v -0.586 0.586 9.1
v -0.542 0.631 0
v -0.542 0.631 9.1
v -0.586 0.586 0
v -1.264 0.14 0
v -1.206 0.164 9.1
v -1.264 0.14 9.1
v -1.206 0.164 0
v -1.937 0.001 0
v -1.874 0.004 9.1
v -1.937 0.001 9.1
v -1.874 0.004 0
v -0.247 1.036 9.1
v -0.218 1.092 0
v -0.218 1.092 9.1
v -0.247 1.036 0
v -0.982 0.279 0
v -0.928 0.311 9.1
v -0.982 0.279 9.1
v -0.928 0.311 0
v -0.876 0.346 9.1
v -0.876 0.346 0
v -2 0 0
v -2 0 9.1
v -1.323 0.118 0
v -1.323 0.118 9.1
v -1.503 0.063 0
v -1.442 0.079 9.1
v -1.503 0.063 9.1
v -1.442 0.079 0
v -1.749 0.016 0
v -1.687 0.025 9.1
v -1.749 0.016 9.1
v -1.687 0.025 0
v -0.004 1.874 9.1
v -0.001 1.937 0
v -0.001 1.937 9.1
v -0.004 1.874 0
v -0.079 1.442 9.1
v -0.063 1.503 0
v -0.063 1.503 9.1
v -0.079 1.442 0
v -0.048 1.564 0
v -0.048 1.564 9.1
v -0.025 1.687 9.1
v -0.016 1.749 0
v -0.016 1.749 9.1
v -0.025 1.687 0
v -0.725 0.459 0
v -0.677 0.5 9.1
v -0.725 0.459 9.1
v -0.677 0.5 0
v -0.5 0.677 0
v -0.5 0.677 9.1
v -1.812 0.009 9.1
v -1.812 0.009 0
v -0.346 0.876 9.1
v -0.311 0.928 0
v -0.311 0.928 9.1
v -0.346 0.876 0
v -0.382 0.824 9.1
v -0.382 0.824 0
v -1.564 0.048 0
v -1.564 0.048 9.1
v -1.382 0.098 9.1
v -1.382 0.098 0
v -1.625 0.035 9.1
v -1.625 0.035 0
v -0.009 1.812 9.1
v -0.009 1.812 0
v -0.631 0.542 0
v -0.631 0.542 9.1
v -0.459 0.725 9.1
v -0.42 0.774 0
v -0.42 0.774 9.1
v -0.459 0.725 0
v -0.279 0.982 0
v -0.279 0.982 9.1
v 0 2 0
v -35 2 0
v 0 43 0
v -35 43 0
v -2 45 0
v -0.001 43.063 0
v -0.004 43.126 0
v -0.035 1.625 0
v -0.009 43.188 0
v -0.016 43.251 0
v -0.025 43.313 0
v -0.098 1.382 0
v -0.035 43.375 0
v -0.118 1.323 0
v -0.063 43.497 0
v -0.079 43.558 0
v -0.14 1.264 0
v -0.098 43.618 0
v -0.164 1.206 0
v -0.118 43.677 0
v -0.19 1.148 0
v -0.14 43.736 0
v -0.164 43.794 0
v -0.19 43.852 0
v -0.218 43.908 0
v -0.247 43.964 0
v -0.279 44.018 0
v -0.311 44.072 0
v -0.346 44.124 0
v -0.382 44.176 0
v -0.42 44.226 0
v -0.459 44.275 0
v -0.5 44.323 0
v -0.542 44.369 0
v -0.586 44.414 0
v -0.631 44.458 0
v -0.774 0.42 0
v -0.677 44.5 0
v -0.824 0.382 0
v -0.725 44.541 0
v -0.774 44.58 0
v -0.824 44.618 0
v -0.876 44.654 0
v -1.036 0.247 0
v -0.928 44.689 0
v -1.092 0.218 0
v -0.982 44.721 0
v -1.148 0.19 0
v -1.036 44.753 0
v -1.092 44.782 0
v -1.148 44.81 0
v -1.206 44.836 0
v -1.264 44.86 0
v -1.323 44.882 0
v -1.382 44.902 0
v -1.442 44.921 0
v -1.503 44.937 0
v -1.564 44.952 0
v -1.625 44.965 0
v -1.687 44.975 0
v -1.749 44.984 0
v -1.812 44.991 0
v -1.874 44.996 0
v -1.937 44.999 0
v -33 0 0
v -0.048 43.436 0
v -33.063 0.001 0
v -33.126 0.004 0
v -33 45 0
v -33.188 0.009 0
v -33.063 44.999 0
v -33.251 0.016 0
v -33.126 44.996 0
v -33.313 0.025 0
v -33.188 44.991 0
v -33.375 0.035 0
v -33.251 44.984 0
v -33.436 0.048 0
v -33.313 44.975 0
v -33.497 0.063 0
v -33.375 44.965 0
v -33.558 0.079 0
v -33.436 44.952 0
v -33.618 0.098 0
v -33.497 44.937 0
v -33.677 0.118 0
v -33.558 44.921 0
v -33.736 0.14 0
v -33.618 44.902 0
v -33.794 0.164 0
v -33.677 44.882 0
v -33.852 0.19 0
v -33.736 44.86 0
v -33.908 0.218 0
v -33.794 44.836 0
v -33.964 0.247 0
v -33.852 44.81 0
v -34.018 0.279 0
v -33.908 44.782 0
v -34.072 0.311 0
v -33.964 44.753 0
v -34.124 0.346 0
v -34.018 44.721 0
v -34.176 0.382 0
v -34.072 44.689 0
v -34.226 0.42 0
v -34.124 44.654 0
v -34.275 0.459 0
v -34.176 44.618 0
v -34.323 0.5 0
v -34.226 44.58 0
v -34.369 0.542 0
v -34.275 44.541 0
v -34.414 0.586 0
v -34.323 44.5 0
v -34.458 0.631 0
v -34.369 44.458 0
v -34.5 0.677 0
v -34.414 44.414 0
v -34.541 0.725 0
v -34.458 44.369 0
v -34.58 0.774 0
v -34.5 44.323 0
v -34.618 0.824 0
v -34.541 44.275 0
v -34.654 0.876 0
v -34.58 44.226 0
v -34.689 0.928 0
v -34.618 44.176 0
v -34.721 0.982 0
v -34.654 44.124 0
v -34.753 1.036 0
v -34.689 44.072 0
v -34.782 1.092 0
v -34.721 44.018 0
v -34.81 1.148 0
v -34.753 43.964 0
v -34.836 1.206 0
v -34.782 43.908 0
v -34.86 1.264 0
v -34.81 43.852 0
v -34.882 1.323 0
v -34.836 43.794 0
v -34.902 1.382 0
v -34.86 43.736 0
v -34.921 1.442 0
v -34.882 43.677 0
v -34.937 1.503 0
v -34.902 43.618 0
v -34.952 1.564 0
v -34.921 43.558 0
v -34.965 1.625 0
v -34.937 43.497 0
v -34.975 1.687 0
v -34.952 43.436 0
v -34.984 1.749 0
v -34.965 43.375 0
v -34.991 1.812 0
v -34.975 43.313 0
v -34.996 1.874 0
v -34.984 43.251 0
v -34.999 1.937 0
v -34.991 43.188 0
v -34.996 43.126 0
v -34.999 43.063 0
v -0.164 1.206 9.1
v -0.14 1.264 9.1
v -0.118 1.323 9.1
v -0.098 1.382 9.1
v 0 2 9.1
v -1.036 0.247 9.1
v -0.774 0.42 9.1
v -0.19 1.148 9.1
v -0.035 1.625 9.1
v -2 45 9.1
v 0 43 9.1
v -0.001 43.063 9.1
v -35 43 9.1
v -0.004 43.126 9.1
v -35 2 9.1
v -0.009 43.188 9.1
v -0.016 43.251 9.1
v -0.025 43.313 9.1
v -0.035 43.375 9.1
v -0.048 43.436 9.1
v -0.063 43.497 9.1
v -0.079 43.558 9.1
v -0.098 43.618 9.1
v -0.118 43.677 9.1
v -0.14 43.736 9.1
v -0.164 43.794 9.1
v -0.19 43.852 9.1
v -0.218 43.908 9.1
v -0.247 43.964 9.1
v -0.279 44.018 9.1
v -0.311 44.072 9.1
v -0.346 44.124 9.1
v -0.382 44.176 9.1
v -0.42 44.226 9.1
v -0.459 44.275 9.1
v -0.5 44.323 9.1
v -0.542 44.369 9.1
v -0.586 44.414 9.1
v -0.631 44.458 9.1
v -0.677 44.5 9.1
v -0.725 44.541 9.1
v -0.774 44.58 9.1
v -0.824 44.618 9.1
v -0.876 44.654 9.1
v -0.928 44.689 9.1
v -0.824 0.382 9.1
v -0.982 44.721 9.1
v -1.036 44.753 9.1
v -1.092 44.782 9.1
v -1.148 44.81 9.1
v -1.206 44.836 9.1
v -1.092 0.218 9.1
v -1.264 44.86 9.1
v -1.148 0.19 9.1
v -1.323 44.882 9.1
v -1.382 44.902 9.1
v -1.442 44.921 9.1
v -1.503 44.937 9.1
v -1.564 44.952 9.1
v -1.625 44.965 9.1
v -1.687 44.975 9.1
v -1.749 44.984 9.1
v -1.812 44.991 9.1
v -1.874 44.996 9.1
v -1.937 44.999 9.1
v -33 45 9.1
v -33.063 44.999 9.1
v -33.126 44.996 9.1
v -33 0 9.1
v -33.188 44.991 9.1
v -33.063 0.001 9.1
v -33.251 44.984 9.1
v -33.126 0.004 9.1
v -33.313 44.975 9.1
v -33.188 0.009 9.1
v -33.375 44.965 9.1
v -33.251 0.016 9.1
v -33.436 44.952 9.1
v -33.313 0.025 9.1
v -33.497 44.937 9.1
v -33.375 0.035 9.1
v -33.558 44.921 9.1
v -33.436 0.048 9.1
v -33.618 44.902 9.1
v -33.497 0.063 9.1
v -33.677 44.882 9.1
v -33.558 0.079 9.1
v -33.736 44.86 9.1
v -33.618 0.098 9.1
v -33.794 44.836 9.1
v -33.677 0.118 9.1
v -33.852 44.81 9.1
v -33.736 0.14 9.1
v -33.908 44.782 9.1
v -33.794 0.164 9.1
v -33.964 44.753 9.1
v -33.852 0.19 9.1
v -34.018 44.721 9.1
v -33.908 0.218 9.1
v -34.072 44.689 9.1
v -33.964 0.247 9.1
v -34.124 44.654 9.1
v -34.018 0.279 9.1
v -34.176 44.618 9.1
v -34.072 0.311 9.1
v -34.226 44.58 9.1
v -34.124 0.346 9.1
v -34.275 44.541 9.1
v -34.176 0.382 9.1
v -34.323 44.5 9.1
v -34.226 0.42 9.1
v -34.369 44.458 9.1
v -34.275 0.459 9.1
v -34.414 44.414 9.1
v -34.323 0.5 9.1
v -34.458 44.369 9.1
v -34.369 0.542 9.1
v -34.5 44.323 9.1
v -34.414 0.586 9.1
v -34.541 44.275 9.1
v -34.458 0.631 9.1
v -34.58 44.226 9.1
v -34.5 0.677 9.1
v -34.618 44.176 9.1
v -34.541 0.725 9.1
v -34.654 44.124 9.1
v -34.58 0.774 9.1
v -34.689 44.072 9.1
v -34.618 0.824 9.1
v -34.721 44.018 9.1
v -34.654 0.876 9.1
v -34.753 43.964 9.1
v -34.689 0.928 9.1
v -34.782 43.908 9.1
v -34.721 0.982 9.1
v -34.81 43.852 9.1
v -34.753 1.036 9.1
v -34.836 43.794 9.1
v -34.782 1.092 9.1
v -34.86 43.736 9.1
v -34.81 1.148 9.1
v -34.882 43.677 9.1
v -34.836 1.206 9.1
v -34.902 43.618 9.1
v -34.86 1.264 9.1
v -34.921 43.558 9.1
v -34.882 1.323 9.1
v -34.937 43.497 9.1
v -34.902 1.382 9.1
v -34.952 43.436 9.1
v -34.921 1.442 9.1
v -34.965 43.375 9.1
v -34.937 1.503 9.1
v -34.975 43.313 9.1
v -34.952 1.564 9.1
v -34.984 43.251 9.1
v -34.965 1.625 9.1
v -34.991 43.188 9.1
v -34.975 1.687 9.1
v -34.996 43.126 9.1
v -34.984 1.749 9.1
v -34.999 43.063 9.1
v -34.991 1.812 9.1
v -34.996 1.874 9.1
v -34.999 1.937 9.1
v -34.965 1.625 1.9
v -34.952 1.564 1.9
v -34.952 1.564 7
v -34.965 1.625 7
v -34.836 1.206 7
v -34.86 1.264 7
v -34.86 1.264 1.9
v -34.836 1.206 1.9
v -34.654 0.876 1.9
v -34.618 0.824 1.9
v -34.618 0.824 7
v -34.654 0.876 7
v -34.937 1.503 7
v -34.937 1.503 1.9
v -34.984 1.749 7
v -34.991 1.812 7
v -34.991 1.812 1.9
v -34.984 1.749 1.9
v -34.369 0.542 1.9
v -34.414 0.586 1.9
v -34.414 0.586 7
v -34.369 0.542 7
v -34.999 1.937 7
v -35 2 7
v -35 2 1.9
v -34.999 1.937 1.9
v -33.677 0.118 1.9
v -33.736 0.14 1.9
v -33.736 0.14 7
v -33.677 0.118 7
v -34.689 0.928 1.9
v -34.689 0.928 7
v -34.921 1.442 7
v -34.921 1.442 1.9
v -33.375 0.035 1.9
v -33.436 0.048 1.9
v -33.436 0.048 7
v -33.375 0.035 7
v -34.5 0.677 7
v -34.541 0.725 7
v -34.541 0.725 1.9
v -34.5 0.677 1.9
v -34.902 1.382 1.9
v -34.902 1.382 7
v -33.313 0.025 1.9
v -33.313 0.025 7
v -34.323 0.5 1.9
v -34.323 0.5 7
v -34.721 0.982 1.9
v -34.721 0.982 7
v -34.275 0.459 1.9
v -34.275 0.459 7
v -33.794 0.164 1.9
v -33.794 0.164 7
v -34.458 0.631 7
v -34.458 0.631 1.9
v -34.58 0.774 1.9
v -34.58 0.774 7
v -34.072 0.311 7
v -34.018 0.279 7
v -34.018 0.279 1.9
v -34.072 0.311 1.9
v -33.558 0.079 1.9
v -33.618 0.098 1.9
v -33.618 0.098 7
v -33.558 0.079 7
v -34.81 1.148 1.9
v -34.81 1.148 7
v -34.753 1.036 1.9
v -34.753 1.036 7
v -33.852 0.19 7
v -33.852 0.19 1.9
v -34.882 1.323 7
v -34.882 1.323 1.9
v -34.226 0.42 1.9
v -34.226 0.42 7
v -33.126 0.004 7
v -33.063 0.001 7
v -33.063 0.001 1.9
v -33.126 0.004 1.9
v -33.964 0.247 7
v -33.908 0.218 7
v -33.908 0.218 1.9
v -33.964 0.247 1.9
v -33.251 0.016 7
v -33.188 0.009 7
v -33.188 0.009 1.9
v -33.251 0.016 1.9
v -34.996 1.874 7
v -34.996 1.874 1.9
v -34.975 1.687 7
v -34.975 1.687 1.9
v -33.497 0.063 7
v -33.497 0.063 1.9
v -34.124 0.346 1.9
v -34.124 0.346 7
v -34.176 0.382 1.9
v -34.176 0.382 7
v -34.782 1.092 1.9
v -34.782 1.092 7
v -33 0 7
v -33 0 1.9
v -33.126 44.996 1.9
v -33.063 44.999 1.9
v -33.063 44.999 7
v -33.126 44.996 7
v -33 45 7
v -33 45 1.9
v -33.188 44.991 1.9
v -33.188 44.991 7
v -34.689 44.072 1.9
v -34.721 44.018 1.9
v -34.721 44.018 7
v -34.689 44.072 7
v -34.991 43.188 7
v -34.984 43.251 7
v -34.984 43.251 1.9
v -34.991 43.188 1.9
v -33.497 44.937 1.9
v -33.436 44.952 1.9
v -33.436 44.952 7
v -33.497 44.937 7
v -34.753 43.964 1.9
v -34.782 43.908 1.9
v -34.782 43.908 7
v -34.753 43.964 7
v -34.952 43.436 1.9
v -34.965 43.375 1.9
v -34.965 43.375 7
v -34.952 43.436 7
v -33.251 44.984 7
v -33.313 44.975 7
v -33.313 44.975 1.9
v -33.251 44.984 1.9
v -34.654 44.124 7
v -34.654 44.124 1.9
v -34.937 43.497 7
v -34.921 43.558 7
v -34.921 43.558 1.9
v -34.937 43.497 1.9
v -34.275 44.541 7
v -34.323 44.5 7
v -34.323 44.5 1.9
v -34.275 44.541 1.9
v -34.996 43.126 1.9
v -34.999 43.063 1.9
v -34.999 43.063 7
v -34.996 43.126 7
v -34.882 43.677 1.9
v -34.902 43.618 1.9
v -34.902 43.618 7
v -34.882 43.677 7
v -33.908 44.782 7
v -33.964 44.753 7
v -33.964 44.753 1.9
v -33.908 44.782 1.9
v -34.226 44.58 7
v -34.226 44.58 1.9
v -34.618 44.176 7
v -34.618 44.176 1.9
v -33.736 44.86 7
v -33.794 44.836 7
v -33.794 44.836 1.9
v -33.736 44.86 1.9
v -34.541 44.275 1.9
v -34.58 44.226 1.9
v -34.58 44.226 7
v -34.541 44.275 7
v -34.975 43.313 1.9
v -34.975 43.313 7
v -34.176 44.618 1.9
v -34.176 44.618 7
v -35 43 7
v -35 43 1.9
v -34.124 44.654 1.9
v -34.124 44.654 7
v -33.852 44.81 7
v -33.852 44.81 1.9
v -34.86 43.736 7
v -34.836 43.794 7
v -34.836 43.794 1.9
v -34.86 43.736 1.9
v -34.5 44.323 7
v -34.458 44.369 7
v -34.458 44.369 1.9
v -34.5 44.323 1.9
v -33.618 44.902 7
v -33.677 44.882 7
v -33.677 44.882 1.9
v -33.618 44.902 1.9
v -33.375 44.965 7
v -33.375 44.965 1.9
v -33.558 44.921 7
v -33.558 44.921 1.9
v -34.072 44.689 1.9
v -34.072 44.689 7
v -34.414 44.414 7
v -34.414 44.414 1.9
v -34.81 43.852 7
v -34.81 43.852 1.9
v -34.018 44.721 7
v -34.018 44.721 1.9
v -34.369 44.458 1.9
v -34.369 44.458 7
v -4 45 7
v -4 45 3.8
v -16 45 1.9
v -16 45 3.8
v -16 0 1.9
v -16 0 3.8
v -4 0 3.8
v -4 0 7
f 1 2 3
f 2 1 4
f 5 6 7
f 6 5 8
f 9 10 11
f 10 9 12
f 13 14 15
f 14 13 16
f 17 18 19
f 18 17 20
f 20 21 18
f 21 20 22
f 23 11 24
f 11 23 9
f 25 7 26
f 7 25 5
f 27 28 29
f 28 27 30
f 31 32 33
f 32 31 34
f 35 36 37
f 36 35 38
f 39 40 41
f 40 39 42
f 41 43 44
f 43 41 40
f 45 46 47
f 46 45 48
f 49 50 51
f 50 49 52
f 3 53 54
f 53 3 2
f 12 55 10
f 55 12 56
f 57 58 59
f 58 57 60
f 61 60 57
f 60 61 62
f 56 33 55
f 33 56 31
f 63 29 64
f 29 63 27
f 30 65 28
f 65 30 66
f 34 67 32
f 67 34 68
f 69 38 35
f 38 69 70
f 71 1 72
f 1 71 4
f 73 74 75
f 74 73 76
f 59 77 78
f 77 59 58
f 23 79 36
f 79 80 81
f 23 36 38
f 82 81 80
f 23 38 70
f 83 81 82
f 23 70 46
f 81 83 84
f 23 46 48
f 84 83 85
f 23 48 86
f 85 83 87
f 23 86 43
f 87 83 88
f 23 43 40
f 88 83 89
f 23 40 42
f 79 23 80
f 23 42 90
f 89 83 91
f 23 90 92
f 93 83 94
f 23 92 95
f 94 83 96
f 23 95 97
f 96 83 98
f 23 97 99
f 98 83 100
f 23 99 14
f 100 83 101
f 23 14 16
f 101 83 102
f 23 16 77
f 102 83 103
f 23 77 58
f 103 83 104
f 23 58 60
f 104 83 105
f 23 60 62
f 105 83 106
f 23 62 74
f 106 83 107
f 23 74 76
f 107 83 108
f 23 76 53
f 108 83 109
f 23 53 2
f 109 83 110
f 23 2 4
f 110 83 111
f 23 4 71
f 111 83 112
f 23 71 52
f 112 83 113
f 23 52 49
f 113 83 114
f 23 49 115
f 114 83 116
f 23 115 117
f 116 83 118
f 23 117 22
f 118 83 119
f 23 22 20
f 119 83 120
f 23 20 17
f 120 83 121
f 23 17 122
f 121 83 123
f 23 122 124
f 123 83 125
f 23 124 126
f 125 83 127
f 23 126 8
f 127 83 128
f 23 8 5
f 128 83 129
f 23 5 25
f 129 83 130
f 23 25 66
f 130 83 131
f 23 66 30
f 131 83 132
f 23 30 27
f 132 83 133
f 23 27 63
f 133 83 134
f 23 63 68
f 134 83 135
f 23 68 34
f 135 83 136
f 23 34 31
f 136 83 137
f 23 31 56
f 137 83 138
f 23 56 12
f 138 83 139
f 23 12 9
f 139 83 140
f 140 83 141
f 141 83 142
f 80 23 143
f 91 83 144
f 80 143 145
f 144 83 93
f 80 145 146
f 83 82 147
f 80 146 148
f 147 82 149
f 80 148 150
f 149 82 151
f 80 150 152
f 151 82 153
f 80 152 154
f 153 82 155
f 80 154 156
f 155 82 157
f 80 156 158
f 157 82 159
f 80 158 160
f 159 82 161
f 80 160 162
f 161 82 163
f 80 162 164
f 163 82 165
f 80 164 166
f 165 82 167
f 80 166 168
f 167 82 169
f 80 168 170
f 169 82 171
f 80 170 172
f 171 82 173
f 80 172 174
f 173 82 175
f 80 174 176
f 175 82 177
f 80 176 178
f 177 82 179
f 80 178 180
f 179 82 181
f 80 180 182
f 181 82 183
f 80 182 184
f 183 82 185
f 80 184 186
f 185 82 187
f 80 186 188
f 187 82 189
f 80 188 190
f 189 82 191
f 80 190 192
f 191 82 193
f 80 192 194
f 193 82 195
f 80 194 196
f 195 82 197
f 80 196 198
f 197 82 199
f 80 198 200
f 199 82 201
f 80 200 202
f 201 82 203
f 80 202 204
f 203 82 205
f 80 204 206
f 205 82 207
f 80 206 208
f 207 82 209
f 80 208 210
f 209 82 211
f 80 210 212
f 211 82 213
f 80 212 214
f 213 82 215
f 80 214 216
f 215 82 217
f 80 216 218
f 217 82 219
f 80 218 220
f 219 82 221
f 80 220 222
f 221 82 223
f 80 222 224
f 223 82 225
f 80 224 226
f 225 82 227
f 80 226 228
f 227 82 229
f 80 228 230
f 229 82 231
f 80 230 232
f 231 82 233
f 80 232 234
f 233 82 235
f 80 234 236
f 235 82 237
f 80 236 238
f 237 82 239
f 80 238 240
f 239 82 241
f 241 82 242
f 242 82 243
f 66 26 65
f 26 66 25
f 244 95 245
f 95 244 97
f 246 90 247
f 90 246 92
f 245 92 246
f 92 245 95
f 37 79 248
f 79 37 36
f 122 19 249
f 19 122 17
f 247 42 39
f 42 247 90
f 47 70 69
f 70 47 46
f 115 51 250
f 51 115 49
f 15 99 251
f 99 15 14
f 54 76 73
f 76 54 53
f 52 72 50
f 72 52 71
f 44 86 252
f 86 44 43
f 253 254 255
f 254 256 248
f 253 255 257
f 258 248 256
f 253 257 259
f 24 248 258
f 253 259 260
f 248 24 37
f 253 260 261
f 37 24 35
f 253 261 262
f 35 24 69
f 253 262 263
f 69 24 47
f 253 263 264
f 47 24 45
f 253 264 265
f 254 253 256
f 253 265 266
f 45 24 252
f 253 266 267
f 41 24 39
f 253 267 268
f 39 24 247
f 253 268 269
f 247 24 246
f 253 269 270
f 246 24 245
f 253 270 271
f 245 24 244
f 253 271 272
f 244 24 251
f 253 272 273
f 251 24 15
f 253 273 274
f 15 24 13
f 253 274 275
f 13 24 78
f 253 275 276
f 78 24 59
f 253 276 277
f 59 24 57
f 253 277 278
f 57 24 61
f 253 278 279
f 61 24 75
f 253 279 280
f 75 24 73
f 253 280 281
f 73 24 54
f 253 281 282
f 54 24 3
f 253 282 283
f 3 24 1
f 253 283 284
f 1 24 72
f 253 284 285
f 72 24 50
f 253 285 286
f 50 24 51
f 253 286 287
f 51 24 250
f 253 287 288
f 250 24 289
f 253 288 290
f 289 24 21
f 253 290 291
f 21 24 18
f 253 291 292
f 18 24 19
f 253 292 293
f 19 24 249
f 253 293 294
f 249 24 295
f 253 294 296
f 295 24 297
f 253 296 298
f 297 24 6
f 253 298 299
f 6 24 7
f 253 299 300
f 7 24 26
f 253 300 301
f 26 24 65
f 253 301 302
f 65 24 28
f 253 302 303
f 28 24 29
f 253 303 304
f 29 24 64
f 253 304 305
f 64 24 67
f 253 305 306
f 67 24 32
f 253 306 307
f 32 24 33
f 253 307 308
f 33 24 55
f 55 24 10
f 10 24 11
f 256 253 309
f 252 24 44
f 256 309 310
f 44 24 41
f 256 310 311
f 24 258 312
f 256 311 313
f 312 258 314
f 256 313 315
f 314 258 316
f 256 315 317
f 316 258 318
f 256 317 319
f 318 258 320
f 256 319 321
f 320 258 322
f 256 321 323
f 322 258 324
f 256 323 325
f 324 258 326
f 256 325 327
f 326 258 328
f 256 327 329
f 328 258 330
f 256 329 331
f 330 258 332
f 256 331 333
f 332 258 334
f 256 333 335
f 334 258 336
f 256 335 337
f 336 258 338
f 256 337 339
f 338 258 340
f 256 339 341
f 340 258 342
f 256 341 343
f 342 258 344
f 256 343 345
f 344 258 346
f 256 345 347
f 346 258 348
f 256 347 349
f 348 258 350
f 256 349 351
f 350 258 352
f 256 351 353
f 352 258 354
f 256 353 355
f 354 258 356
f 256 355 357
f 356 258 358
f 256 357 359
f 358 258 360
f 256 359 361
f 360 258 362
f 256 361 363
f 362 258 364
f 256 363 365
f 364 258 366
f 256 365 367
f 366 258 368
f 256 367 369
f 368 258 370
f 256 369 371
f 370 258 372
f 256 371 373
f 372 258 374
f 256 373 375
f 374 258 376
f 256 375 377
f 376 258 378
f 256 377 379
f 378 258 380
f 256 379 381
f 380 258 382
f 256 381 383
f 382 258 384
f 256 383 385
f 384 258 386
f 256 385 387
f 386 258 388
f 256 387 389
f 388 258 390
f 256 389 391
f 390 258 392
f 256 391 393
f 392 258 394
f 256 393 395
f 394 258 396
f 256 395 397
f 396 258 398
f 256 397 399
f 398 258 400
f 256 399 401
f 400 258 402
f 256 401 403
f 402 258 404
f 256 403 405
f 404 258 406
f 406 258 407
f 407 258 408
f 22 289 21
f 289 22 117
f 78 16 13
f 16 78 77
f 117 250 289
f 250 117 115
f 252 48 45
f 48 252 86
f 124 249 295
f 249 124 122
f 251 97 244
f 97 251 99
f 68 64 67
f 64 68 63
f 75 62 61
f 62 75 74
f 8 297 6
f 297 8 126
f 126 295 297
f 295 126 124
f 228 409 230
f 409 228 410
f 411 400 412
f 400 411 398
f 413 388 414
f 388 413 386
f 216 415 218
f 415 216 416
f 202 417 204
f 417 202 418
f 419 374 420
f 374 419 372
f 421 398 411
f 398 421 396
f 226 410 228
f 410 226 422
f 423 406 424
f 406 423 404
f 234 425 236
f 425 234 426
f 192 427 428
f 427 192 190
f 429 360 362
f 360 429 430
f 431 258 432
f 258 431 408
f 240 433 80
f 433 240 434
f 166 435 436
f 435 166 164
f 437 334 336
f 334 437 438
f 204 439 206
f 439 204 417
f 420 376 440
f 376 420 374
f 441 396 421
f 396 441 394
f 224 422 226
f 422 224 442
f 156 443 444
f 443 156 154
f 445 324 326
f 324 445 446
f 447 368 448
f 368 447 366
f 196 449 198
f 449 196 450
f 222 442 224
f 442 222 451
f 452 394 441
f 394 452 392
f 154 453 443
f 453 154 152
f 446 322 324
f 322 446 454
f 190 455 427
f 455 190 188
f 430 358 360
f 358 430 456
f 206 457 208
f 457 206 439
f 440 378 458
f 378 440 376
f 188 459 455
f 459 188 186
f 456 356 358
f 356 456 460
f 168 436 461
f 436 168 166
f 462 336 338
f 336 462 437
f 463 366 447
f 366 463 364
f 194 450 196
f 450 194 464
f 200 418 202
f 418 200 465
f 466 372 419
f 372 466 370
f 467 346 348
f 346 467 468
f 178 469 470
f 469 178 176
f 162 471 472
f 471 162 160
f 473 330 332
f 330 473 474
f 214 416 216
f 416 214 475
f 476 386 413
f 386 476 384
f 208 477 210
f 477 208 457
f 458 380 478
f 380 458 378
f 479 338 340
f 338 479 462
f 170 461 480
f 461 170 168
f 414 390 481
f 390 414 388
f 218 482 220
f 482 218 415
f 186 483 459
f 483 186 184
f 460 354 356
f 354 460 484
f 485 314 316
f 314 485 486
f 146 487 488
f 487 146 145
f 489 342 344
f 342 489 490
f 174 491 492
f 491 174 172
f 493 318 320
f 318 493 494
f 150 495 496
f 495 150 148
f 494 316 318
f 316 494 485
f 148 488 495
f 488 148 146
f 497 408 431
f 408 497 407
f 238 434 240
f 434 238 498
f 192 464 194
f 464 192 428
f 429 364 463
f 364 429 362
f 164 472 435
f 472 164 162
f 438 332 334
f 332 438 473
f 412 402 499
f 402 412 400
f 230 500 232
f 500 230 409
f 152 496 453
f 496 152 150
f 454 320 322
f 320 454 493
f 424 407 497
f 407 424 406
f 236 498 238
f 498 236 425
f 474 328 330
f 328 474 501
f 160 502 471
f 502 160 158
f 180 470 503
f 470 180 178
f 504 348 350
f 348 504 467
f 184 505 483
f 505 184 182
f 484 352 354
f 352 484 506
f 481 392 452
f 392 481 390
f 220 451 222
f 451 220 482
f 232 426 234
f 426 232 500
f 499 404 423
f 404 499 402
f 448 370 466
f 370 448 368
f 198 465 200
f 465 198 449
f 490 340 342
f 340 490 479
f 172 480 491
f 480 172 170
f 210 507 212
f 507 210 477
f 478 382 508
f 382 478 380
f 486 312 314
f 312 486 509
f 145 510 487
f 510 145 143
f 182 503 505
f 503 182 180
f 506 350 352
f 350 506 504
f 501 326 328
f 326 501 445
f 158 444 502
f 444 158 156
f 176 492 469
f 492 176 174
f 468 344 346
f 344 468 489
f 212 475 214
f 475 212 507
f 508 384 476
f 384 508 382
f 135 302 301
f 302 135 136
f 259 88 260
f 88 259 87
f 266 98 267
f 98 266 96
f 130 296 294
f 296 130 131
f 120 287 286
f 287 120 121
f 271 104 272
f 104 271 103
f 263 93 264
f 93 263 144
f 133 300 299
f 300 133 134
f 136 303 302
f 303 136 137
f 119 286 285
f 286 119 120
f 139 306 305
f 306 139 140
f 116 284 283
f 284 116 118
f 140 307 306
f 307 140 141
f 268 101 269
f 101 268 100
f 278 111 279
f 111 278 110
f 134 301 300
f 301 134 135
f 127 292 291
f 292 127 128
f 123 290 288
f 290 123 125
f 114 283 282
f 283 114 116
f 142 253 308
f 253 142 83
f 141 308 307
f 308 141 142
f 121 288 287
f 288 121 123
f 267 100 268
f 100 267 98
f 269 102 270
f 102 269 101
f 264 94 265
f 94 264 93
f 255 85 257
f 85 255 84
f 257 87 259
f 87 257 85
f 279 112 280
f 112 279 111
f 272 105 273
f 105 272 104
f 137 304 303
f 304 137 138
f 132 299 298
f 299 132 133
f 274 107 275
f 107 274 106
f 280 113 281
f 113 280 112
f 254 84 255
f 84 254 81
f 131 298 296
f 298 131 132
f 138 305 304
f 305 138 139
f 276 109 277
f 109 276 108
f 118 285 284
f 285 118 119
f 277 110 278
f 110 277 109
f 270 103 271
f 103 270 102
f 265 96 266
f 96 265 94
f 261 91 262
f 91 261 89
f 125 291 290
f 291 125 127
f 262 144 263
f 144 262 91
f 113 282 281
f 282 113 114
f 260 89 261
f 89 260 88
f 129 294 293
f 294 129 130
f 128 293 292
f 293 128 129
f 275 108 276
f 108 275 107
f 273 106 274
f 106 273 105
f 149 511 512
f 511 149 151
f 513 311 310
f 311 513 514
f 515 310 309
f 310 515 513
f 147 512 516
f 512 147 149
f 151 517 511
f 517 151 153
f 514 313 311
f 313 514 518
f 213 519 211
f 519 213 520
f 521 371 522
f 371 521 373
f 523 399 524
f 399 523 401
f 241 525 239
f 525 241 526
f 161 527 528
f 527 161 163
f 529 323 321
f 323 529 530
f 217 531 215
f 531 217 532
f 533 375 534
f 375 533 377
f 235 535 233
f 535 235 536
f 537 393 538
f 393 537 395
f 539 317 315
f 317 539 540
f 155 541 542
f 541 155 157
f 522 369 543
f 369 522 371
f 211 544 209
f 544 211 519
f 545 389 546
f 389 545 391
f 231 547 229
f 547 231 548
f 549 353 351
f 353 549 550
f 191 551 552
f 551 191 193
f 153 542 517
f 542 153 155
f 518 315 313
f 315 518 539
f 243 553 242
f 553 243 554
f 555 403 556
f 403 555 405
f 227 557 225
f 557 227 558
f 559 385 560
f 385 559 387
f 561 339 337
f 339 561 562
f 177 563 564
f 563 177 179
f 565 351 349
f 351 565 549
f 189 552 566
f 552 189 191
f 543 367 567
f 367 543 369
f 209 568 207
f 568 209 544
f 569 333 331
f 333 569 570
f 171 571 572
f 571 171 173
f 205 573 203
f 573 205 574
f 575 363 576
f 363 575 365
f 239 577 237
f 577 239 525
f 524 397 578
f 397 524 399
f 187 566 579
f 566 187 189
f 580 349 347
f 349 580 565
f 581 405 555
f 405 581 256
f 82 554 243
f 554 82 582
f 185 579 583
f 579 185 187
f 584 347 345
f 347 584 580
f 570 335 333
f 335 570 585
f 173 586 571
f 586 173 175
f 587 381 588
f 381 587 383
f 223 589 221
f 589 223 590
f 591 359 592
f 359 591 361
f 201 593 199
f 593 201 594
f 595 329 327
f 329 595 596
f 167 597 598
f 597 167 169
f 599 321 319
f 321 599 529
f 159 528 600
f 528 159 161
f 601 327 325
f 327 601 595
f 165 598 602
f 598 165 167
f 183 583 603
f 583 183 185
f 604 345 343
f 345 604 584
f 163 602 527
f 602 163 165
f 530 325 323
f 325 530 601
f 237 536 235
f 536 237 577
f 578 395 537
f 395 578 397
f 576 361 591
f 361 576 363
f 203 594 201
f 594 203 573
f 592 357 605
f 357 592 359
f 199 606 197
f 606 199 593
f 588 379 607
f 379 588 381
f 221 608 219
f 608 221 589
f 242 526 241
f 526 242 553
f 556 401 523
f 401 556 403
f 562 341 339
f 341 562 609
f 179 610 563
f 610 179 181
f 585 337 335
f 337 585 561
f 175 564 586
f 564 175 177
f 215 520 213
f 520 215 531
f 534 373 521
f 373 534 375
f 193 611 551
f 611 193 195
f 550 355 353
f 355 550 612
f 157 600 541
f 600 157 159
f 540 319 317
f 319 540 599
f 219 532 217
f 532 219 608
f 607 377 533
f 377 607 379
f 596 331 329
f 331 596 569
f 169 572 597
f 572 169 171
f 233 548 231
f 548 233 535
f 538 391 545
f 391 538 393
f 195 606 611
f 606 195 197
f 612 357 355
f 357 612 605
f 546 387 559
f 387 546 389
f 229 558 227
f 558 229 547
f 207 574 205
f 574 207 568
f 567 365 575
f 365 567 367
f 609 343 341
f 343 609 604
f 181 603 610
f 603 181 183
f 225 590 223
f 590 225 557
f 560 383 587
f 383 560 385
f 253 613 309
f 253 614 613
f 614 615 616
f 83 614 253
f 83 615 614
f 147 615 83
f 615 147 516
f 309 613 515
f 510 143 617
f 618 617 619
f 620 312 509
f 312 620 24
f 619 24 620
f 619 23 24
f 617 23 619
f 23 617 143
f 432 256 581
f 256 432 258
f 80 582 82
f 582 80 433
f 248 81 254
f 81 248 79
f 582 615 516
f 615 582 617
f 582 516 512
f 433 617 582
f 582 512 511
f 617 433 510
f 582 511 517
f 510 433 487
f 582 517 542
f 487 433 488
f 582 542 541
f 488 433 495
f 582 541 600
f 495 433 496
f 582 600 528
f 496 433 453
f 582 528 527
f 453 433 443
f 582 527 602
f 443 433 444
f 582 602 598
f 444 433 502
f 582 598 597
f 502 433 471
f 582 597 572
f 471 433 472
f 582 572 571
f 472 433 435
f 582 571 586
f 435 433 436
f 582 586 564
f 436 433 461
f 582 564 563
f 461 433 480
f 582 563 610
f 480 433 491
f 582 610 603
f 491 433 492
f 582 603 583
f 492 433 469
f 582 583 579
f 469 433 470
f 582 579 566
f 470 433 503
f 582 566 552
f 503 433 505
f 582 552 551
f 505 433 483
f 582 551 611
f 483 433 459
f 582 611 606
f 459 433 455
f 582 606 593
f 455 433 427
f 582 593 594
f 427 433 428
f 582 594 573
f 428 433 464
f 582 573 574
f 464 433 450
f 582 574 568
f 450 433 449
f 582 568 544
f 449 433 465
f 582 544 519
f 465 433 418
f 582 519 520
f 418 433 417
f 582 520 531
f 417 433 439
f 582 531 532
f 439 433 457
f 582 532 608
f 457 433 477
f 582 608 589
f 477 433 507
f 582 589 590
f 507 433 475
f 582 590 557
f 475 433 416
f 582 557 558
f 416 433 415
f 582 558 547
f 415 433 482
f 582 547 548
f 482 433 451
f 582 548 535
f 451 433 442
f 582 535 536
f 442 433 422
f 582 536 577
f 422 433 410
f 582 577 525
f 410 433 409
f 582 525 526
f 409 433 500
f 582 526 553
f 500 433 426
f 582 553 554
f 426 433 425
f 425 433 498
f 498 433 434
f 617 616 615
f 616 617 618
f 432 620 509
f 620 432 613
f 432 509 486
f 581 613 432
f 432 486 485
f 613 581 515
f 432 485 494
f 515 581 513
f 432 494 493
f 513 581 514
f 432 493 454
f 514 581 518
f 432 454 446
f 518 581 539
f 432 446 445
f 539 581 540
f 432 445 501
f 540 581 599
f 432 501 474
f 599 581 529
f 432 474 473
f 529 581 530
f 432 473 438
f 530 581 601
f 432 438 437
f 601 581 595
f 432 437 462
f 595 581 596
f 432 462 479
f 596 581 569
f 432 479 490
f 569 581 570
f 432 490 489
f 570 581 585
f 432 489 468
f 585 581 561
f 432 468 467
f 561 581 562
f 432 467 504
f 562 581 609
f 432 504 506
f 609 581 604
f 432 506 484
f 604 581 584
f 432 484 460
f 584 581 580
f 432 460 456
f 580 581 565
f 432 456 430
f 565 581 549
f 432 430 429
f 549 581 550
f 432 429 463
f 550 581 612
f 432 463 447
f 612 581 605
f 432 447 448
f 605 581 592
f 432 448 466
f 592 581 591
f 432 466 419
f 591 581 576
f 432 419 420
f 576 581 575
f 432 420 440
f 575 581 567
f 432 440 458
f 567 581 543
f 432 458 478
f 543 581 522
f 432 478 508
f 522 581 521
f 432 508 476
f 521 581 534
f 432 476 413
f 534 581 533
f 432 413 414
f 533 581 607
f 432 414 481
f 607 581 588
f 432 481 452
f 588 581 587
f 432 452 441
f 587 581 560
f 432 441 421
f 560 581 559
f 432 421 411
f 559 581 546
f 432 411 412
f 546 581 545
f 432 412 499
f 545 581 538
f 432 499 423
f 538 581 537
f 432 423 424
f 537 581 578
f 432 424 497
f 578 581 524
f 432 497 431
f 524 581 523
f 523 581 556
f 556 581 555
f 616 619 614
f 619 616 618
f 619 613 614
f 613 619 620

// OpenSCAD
// file: ../sc.scad
// ShortCuts.scad 
// Autor: Rudolf Huttary, Berlin 2015
//
$fn = 100; 

//show_examples(); 

module show_examples()
	place_in_rect(30, 30)
	{
		Cy(h = 10); 
		CyH(h = 10); 
		CyH(h = 10, w = 30); 
		CyS(h = 10); 
		CyS(h = 10, w1 = 25, w2 = 75); 
		Cu(10); 
		Ri(h = 10); 
		RiH(h = 10); 
		RiS(h = 10, w1 = 10); 
		RiS(h = 10, w1 = 30, w2 = 300); 
		Sp(); 
		SpH(10, 30, 30); 
	}


module help()
{
echo("==============="); 
echo("help(): shows this help"); 
echo("show_examples(): shows some examples"); 
echo("place_in_rect(): places children objects in grid"); 
echo("Transformations:"); 
echo(" transform :  T(x=0, y=0, z=0), Tx(x=0) , Ty(y=0), Tz(z=0)"); 
echo(" rotate :  R(x=0, y=0, z=0), Rx(x=0) , Ry(y=0), Rz(z=0)"); 
echo(" scale :  S(x=1, y=1, z=1), Sx(x=1) , Sy(y=1), Sz(z=1)"); 
echo("Logical"); 
echo(" difference :  D()"); 
echo(" union :  U()"); 
echo(" intersection : *missing*"); 
echo("Primitives"); 
echo(" circle :  Ci(r=10)"); 
echo(" circle_half :  CiH(r=10, w=0)")
echo(" circle_segment :  CiS(r=10, w1=0, w2=90)")
echo(" square :  Sq(x=10, y=0, center=true))"); 
echo(" cylinder :  Cy(r=10, h=1, center=true)"); 
echo(" cylinder_half :  CyH(r=10, w=0)")
echo(" cylinder_segment: CyS(r=10, h=1, w1=0, w2=90,center=true)"); 
echo(" cylinder_segment: Pie(r=10, h=1, w1=0, w2=90,center=true)"); 
echo(" cube :  Cu(x=10, y=0, z=10, center=true)"); 
echo(" ring :  Ri(R=10, r=5, h=1, center=true)"); 
echo(" ring_half :  RiH(R=10, r=5, h=1, w=0 center=true)"); 
echo(" ring_segment :  RiS(R=10, r=5, h=1, w1=0, w2=90, center=true)"); 
echo(" sphere:  Sp(r=10))"); 
echo(" sphere_half:  SpH(r=10, w1 = 0, w2 = 0))"); 
echo("==============="); 
}

// Euclidean Transformations
module T(x=0, y=0, z=0){translate([x, y, z])children(); }
module Tx(x) { translate([x, 0, 0])children(); }
module Ty(y) { translate([0, y, 0])children(); }
module Tz(z) { translate([0, 0, z])children(); }

module R(x=0, y=0, z=0){rotate([x, y, z]) children();}
module Rx(x=90){rotate([x, 0, 0]) children();}
module Ry(y=90){rotate([0, y, 0]) children();}
module Rz(z=90){rotate([0, 0, z]) children();}

module M(x=0, y=0, z=0){mirror([x, y, z]) children();}
module Mx(x=1){mirror([x, 0, 0]) children();}
module My(y=1){mirror([0, y, 0]) children();}
module Mz(z=1){mirror([0, 0, z]) children();}

module S(x=1, y=1, z=1){scale([x, y, z]) children();}
module Sx(x=1){scale([x, 1, 1]) children();}
module Sy(y=1){scale([1, y, 1]) children();}
module Sz(z=1){scale([1, 1, z]) children();}

module D() difference(){children(0); children([1:$children-1]);}
module U() children([0:$children-1]);
// module I() intersection()children([0:$children-1]); // does not work for some reason


// primitives - 2D

module Sq(x =10, y = 0, center = false)
{
   if(y==0)
		square([x, x], center = center); 
	else
		square([x, y], center = center); 
}
module Ci(r = 10)
{
	circle(r = r); 
}

// derived primitives - 2d
module CiH(r = 10, w = 0)
  circle_half(r, w); 

module CiS(r = 10, w1 = 0, w2 = 90)
  circle_segment(r, w1, w2); 


// primitives - 3d
module Cy(r = 10, h = 1, center = false)
{
	cylinder(r = r, h = h, center = center); 
}
module Cu(x = 10, y = 0, z = 10, center = false)
{
  if (y==0)
	cube([x, x, x], center = center); 
  else
	cube([x, y, z], center = center); 
}

// derived primitives - 3d
module CyH(r = 10, h = 1, w = 0, center = false)
  cylinder_half(r, h, w, center); 

module CyS(r = 10, h = 1, w1 = 0, w2 = 90, center = false)
  cylinder_segment(r, h, w1, w2, center); 

module Ri(R = 10, r = 5, h = 1, center = false)
  ring(R, r, h, center); 

module RiS(R = 10, r = 5, h = 1, w1 = 0, w2 = 90, center = false)
   ring_segment(R, r, h, w1, w2, center); 

module RiH(r1 = 10, r2, h = 1, w = 0, center = false)
   ring_half(r1, r2, h, w, center); 
module Pie(r = 10, h = 1, w1 = 0, w2 = 90, center = false)
  cylinder_segment(r, h, w1, w2, center);  
module Sp(r = 10)
  sphere(r); 
module SpH(r = 10, w1 = 0, w2 = 0)
  sphere_half(r, w1, w2); 
module SpS(r = 10, w1 = 0, w2 = 90, w3 = 90)
  sphere_segment(r, w1, w2); 




// clear text definitions
module circle_half(r = 10, w = 0)
{
	difference()
	{
		circle(r); 
     rotate([0, 0, w-90])
     translate([0, -r])
		square([r, 2*r], center = false); 
	}
}

module circle_segment(r = 10, w1 = 0, w2 = 90)
{
  W2 = (w1>w2)?w2+360:w2; 
  if (W2-w1 < 180)
    intersection()
		{
       circle_half(r, w1); 
       circle_half(r, W2-180); 
 		}
	else
    union()
		{
       circle_half(r, w1); 
       circle_half(r, W2-180); 
 		}
}

module cylinder_half(r = 10, h = 1, w = 0, center = true)
{
  linear_extrude(height = h, center = center)
  circle_half(r, w); 
} 

module cylinder_segment(r = 10, h = 1, w1 = 0, w2 = 90, center = true)
{
  linear_extrude(height = h, center = center)
  circle_segment(r, w1, w2); 
} 

module ring(R = 10, r = 5, h = 1, center = true)
{
	difference()
	{
	cylinder(r = R, h = h, center = center); 
   translate([0, 0, -2*h])
	cylinder(r = r, h = 4*h, center = false); 
	}
}

module ring_half(R = 10, r = 5, h = 1, w = 0, center = true)
{
	difference()
	{
		ring(R, r, h, center); 
     rotate([0, 0, w])
     translate([0, -R/2, 0])
		cube([2*R, R, 3*h], center = true); 
	}
}

module ring_segment(R = 10, r = 5, h = 1, w1 = 0, w2 = 90, center = true)
{
  W2 = (w1>w2)?w2+360:w2; 
  if (W2-w1 < 180)
    intersection()
		{
       ring_half(R, r, h, w1, center); 
       ring_half(R, r, h, W2-180, center); 
 		}
	else
    union()
		{
       ring_half(R, r, h, w1, center); 
       ring_half(R, r, h, W2-180, center); 
 		}
}


module sphere_half(r = 10, w1 = 0, w2 = 0)
{  
	difference()
	{
   	sphere(r); 
      rotate([-w1, -w2, 0])
     	translate([0, 0, r])
		cube([2*r, 2*r, r], center = true); 
	}

}


// additional code
module place_in_rect(dx =20, dy=20)
{
  cols = ceil(sqrt($children)); 
  rows = floor(sqrt($children)); 
  for(i = [0:$children-1])
	{ 
	  T(dx*(-cols/2+(i%cols)+.5), dy*(rows/2-floor(i/cols)-.5))
		 children(i); 
	}
}
// file: config.scad
/* SuperSlicer */
fit=0.3;
pressfit=0.2;
tol=0.2;
/* PrusaSlicer *
fit=0.5;
pressfit=0.4;
tol=0.3;
/**/
m3=3.2+tol;
m3_nut=5.5+tol;

m5=5.25;
fc=5.25;   // frame chanel

layer_height=0.28;

/* Carriage Dimensions */
tbd=27; //top bottom depth
tbw=44;

car_thick=8;
car_width=44;   // Min. 42mm

axis_diam=8;
bush_width=15;
ybush_len=45;   //LM8LUU
xbush_len= car_width-4;
axis_distance=55;
thick_min=2;
r=(bush_width/2)+thick_min;
d=r*2;
dax=24; //15 center to axis

// distance from belts center to frame
upper_distance = dax + 13/2 + 3;   

center_h=axis_distance-d;
thick= 6;

belt_size=6;
belt_distance=3; // internal space between belts
belt_thick=1.4;

center=axis_distance/2+r;
center_from_top= center;
center_screw_z=center_h/2-.5;

// Total height of hotend (top to nozzle tip) in mm (E3Dv6: ~63mm, Volcano: ~72mm)
hotend_height = 72.6;

Mountingpoint_width = 30;
// main file
include <config.scad>
use <parts.scad>
use <../lib.scad>
$fn=200;

line_width=0.44;
line_height=0.20;

w=45;
l=35;
bh=3.2;
gh=1.9;
t=2;
gcut=12;

h=bh+gh+2*t;

rotate([0,0,90]){
    difference(){
        union(){
            rcube(w,l,h,2);
        }
        
        // glass cut
        translate([-.1, gcut+t*2, gh])
        cube([w+1, l,gh+1]);

        // bed cut
        translate([-.1, t*2, gh+t-.1])
        cube([w+1, l,bh]);        
    }
}
